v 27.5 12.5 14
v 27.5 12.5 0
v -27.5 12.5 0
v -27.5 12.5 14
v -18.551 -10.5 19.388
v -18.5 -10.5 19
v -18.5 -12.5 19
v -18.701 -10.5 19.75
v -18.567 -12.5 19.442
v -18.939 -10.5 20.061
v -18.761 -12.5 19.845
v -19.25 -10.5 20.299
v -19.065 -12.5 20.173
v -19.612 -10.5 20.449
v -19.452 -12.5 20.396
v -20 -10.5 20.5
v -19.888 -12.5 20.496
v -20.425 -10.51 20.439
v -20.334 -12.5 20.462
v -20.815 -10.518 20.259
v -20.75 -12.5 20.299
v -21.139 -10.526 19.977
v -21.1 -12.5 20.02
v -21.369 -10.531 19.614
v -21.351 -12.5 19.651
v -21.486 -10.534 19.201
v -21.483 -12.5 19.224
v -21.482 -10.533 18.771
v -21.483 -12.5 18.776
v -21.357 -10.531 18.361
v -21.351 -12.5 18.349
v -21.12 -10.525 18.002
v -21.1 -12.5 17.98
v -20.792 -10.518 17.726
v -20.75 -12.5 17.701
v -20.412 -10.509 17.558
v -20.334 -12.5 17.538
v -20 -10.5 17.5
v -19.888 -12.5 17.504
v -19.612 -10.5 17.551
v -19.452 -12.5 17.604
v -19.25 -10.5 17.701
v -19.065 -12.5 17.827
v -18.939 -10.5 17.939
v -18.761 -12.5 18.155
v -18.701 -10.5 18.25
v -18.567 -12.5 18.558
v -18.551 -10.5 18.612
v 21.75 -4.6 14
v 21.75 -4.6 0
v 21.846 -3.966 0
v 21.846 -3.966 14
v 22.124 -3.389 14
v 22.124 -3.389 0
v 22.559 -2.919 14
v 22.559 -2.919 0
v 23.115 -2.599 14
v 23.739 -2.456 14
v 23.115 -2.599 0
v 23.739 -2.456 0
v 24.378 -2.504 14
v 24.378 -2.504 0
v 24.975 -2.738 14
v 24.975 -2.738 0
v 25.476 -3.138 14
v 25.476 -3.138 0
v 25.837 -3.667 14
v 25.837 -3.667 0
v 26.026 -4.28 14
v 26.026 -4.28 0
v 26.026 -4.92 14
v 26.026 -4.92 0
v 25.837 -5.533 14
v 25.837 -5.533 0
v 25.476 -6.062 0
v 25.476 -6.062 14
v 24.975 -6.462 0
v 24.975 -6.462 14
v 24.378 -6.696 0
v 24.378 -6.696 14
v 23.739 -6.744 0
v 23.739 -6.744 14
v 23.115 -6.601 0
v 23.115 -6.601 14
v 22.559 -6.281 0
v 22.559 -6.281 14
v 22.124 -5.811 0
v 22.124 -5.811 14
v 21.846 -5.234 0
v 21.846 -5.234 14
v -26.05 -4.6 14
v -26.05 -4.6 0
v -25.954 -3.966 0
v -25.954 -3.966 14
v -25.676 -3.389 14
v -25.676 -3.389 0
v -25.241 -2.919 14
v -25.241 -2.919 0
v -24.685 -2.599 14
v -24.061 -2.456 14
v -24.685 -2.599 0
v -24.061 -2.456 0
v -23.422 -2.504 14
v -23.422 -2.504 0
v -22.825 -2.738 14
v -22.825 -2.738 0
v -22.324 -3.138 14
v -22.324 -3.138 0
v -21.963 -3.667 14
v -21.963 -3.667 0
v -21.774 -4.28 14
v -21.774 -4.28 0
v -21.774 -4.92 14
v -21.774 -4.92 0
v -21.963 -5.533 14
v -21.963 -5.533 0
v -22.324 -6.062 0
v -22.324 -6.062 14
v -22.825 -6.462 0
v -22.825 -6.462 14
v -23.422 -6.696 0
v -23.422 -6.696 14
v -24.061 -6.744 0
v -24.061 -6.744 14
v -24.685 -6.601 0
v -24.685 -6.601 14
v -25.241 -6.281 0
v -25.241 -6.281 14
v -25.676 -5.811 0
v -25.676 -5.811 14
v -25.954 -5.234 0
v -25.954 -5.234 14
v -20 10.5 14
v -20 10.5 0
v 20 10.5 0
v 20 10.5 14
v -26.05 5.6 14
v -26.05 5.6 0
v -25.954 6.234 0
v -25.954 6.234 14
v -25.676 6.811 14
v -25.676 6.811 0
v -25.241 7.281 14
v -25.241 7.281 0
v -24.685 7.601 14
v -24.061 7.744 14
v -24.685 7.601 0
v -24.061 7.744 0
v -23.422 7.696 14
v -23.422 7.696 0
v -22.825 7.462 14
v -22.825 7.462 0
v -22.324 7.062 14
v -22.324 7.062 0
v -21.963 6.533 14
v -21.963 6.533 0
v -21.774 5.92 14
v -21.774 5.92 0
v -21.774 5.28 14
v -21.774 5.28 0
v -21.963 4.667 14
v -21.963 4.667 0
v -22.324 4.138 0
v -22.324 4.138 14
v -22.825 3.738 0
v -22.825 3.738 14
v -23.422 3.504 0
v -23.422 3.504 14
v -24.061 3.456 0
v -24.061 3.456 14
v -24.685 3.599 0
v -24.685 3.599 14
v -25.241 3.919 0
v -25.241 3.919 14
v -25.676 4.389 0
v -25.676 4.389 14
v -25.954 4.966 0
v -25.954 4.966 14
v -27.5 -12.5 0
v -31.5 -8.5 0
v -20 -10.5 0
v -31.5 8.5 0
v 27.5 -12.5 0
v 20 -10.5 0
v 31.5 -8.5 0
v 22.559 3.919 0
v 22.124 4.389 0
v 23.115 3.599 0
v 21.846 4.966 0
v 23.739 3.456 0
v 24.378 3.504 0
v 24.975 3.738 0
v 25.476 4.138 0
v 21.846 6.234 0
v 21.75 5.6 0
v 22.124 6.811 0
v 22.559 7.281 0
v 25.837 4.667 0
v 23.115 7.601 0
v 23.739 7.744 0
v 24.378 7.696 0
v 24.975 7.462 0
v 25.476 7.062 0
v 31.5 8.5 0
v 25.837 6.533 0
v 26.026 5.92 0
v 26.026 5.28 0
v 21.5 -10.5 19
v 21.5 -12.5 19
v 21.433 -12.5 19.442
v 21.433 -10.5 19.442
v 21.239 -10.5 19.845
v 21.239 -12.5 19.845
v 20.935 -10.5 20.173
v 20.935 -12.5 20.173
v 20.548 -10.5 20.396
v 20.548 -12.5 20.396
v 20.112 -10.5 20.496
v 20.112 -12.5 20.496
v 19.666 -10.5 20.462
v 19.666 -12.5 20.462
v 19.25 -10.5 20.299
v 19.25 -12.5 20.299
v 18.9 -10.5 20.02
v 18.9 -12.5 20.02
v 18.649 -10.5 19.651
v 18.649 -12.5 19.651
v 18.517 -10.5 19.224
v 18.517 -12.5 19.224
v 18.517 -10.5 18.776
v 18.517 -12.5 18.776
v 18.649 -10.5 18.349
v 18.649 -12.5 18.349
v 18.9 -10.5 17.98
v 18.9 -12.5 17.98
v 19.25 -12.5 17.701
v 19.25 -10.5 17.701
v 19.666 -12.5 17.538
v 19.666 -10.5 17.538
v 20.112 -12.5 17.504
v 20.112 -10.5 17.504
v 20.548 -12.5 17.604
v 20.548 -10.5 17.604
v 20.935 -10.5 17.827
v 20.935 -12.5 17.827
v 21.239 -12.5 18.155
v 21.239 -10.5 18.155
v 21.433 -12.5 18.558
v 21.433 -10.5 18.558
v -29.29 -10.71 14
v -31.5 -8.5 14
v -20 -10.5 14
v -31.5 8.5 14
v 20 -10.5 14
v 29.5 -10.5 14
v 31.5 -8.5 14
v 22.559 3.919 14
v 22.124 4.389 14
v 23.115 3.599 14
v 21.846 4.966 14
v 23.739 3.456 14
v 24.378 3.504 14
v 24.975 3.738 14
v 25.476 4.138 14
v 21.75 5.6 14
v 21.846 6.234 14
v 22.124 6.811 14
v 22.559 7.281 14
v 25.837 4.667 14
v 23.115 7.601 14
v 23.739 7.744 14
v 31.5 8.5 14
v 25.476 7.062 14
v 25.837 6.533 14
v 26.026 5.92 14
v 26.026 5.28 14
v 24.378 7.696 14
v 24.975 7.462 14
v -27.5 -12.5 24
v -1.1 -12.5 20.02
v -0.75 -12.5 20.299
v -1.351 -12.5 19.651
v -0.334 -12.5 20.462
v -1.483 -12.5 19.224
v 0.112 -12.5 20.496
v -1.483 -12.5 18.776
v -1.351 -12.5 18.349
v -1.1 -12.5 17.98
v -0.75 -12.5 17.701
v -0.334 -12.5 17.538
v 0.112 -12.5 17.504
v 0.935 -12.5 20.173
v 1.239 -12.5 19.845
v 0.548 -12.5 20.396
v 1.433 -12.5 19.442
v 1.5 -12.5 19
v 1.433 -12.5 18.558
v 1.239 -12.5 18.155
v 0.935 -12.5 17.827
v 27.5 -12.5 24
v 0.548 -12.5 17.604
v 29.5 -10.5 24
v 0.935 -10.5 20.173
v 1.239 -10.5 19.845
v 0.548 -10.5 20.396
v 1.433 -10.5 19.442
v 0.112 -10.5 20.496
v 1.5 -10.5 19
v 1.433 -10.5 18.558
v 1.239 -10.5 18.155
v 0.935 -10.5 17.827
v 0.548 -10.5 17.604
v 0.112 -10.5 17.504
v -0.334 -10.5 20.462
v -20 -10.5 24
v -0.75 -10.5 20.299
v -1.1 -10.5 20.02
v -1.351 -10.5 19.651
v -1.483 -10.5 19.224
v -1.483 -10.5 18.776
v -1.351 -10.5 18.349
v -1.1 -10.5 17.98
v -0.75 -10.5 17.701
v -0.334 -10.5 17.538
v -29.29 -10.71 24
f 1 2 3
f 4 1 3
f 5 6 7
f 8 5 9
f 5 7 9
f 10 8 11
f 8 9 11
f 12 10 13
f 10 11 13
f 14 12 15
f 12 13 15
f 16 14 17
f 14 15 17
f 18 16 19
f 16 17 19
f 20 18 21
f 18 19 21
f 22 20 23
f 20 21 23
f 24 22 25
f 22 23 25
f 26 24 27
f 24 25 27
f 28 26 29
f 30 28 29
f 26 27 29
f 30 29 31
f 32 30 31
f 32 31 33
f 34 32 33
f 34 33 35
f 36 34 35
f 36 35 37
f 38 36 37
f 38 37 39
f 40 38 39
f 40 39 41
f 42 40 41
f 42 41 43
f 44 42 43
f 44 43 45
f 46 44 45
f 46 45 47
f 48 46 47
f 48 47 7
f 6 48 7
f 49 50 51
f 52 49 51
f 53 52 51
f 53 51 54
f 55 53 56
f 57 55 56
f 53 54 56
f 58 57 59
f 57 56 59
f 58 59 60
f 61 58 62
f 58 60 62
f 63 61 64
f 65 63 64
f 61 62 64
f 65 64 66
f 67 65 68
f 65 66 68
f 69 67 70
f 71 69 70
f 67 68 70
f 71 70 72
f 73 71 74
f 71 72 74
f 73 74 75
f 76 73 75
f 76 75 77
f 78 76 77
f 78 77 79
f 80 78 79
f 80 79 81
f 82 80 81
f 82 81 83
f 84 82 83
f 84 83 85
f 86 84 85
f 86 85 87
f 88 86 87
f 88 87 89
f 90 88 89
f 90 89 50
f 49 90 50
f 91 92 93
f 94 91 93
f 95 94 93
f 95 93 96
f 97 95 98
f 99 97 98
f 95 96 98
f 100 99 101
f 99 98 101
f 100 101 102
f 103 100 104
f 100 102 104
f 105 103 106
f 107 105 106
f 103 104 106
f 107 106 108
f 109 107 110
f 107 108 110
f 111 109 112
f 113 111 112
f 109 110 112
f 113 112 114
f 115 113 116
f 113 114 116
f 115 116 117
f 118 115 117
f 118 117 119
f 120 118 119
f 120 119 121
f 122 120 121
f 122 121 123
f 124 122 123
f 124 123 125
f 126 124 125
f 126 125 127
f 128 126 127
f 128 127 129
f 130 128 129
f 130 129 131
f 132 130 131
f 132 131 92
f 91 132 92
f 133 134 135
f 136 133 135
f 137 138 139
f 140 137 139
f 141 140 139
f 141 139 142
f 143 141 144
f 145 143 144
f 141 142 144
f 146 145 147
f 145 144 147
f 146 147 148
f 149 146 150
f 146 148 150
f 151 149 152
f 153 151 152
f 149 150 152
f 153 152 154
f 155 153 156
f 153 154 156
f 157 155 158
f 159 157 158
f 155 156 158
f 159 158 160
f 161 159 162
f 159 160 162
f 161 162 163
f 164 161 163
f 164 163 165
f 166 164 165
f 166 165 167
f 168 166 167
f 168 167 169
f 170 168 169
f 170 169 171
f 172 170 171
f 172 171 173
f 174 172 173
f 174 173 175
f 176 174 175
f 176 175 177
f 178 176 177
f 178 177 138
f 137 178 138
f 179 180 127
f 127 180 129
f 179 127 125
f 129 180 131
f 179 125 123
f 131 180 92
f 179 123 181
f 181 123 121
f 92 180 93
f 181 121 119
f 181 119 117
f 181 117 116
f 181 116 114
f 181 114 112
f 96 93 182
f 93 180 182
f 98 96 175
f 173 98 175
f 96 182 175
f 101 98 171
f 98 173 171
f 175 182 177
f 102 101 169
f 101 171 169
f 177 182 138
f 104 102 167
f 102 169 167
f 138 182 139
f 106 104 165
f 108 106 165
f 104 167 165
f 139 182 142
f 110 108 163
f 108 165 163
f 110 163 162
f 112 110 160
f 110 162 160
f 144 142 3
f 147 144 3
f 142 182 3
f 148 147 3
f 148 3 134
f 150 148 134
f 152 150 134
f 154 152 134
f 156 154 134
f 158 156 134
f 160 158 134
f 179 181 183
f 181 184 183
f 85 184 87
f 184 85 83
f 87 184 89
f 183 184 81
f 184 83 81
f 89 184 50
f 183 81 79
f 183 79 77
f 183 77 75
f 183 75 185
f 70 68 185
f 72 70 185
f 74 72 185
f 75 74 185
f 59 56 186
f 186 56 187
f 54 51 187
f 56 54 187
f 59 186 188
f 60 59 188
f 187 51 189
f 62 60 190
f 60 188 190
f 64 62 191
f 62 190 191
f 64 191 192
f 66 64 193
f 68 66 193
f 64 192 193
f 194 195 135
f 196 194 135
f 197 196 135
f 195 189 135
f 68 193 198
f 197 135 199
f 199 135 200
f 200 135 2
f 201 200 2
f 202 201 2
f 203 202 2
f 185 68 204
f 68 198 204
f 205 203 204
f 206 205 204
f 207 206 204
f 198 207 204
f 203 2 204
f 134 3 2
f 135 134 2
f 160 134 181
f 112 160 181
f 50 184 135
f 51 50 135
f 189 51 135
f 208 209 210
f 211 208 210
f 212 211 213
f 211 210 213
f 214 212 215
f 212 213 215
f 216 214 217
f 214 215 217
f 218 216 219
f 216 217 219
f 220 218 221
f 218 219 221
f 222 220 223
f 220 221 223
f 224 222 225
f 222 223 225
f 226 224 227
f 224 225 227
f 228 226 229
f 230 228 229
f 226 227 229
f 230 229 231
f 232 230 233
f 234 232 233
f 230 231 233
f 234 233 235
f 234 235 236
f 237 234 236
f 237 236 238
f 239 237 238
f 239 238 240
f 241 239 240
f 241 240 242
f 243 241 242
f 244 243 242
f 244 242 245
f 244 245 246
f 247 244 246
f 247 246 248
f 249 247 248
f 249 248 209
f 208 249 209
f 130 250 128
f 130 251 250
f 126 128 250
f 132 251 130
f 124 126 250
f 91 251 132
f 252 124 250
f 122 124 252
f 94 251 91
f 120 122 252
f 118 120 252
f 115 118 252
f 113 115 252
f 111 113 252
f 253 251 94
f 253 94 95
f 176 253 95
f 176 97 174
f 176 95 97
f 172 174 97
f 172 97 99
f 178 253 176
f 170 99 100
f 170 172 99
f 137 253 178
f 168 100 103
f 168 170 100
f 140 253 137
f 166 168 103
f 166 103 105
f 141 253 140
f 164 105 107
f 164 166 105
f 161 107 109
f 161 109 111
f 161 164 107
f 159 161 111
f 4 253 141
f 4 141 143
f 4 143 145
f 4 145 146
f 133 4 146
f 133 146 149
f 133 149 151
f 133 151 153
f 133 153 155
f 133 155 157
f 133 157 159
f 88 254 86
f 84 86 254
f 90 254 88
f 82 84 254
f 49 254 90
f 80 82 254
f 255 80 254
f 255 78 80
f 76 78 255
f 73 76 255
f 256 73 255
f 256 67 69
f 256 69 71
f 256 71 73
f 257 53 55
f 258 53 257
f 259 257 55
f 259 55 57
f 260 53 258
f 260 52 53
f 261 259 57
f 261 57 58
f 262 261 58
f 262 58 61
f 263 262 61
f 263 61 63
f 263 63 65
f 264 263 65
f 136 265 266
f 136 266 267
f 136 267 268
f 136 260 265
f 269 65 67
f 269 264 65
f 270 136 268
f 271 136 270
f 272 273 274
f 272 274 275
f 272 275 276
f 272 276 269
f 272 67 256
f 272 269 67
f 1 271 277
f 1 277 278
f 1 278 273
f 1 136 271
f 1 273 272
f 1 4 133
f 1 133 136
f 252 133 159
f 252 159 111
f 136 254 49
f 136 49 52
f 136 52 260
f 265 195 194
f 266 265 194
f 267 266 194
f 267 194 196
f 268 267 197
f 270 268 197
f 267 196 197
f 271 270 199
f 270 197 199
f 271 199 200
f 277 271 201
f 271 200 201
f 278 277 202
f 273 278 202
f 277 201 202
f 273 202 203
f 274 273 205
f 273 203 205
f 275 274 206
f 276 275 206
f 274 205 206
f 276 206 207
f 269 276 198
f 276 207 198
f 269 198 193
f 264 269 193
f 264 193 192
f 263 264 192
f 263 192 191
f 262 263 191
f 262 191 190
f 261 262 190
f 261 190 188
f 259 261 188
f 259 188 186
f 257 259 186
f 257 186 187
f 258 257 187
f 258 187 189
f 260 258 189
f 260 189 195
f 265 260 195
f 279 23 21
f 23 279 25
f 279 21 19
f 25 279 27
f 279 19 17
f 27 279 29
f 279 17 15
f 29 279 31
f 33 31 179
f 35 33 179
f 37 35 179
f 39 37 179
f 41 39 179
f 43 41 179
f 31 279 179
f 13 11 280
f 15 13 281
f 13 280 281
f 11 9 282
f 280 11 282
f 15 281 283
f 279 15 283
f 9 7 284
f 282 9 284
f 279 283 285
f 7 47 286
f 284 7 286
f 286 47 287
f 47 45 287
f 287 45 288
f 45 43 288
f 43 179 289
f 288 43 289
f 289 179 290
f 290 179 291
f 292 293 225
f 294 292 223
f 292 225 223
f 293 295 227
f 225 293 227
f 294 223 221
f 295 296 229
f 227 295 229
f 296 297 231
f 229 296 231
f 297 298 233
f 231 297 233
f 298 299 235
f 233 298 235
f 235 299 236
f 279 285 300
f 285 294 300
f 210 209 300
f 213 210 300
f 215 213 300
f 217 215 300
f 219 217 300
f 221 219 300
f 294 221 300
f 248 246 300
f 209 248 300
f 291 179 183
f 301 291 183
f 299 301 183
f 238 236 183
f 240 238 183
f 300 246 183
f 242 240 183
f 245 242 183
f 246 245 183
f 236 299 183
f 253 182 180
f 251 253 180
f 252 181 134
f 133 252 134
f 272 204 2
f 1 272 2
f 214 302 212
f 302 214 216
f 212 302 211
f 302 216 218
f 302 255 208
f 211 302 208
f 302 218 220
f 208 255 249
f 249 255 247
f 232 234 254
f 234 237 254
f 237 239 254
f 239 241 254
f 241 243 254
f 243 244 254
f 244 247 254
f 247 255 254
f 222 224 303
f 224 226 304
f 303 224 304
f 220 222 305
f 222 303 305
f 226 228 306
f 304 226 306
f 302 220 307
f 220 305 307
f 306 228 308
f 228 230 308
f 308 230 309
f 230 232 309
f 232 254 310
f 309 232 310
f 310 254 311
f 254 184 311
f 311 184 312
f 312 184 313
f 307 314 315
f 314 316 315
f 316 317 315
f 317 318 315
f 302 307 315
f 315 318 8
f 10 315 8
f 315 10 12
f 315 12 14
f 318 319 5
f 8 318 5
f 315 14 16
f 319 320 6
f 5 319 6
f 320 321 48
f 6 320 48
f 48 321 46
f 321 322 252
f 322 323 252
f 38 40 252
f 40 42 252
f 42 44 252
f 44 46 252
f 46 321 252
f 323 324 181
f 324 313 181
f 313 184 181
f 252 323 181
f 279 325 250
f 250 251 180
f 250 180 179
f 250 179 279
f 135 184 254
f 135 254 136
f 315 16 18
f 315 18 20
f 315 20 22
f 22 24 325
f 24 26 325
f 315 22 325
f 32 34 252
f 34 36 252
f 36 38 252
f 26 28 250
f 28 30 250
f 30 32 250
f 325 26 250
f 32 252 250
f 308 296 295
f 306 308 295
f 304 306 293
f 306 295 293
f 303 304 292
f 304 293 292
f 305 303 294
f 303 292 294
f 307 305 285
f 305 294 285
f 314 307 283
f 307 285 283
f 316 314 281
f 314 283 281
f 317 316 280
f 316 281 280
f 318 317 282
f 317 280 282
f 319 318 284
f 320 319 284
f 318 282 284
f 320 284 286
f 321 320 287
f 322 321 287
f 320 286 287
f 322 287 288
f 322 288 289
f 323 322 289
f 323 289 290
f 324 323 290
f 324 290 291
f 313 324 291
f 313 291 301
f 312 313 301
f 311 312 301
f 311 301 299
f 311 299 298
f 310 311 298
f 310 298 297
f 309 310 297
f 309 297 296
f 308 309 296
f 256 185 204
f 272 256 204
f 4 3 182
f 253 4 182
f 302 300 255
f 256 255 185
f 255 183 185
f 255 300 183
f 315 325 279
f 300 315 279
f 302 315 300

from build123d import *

# Parameters (mm, degrees)
SKETCH1_W           = 40
SKETCH1_H           = 21
BOSS_EXTRUDE1_DEPTH = 14
SKETCH2_R           = 2.15
CUT_EXTRUDE1_DEPTH  = 15
BOSS_EXTRUDE2_DEPTH = 10
SKETCH4_R           = 1.5
CUT_EXTRUDE3_DEPTH  = 26


with BuildPart() as part:
    # Sketch1 → Boss-Extrude1 (new body)
    with BuildSketch(Plane.XY):
        Polygon((-27.5, 12.5), (-31.5, 8.5), (-31.5, -8.5), (-27.5, -12.5), (27.5, -12.5), (31.5, -8.5), (31.5, 8.5), (27.5, 12.5), align=None)
        Rectangle(SKETCH1_W, SKETCH1_H, mode=Mode.SUBTRACT)
    extrude(amount=BOSS_EXTRUDE1_DEPTH)

    # Sketch2 → Cut-Extrude1 (cut, through all)
    with BuildSketch(Plane(origin=(0, 0, 0), x_dir=(-1, 0, 0), z_dir=(0, 0, -1))):
        with Locations((-23.9, 5.6)):
            Circle(SKETCH2_R)
        with Locations((-23.9, -4.6)):
            Circle(SKETCH2_R)
        with Locations((23.9, 5.6)):
            Circle(SKETCH2_R)
        with Locations((23.9, -4.6)):
            Circle(SKETCH2_R)
    extrude(amount=-CUT_EXTRUDE1_DEPTH, mode=Mode.SUBTRACT)

    # Sketch3 → Boss-Extrude2 (add)
    with BuildSketch(Plane.XY.offset(14)):
        Polygon((-27.5, -12.5), (27.5, -12.5), (29.5, -10.5), (20, -10.5), (-20, -10.5), (-29.290326063, -10.709673937), align=None)
    extrude(amount=BOSS_EXTRUDE2_DEPTH)

    # Sketch4 → Cut-Extrude3 (cut, through all)
    with BuildSketch(Plane.XZ.offset(12.5)):
        with Locations((-20, 19)):
            Circle(SKETCH4_R)
        with Locations((20, 19)):
            Circle(SKETCH4_R)
        with Locations((0, 19)):
            Circle(SKETCH4_R)
    extrude(amount=-CUT_EXTRUDE3_DEPTH, mode=Mode.SUBTRACT)


solid = part.part
